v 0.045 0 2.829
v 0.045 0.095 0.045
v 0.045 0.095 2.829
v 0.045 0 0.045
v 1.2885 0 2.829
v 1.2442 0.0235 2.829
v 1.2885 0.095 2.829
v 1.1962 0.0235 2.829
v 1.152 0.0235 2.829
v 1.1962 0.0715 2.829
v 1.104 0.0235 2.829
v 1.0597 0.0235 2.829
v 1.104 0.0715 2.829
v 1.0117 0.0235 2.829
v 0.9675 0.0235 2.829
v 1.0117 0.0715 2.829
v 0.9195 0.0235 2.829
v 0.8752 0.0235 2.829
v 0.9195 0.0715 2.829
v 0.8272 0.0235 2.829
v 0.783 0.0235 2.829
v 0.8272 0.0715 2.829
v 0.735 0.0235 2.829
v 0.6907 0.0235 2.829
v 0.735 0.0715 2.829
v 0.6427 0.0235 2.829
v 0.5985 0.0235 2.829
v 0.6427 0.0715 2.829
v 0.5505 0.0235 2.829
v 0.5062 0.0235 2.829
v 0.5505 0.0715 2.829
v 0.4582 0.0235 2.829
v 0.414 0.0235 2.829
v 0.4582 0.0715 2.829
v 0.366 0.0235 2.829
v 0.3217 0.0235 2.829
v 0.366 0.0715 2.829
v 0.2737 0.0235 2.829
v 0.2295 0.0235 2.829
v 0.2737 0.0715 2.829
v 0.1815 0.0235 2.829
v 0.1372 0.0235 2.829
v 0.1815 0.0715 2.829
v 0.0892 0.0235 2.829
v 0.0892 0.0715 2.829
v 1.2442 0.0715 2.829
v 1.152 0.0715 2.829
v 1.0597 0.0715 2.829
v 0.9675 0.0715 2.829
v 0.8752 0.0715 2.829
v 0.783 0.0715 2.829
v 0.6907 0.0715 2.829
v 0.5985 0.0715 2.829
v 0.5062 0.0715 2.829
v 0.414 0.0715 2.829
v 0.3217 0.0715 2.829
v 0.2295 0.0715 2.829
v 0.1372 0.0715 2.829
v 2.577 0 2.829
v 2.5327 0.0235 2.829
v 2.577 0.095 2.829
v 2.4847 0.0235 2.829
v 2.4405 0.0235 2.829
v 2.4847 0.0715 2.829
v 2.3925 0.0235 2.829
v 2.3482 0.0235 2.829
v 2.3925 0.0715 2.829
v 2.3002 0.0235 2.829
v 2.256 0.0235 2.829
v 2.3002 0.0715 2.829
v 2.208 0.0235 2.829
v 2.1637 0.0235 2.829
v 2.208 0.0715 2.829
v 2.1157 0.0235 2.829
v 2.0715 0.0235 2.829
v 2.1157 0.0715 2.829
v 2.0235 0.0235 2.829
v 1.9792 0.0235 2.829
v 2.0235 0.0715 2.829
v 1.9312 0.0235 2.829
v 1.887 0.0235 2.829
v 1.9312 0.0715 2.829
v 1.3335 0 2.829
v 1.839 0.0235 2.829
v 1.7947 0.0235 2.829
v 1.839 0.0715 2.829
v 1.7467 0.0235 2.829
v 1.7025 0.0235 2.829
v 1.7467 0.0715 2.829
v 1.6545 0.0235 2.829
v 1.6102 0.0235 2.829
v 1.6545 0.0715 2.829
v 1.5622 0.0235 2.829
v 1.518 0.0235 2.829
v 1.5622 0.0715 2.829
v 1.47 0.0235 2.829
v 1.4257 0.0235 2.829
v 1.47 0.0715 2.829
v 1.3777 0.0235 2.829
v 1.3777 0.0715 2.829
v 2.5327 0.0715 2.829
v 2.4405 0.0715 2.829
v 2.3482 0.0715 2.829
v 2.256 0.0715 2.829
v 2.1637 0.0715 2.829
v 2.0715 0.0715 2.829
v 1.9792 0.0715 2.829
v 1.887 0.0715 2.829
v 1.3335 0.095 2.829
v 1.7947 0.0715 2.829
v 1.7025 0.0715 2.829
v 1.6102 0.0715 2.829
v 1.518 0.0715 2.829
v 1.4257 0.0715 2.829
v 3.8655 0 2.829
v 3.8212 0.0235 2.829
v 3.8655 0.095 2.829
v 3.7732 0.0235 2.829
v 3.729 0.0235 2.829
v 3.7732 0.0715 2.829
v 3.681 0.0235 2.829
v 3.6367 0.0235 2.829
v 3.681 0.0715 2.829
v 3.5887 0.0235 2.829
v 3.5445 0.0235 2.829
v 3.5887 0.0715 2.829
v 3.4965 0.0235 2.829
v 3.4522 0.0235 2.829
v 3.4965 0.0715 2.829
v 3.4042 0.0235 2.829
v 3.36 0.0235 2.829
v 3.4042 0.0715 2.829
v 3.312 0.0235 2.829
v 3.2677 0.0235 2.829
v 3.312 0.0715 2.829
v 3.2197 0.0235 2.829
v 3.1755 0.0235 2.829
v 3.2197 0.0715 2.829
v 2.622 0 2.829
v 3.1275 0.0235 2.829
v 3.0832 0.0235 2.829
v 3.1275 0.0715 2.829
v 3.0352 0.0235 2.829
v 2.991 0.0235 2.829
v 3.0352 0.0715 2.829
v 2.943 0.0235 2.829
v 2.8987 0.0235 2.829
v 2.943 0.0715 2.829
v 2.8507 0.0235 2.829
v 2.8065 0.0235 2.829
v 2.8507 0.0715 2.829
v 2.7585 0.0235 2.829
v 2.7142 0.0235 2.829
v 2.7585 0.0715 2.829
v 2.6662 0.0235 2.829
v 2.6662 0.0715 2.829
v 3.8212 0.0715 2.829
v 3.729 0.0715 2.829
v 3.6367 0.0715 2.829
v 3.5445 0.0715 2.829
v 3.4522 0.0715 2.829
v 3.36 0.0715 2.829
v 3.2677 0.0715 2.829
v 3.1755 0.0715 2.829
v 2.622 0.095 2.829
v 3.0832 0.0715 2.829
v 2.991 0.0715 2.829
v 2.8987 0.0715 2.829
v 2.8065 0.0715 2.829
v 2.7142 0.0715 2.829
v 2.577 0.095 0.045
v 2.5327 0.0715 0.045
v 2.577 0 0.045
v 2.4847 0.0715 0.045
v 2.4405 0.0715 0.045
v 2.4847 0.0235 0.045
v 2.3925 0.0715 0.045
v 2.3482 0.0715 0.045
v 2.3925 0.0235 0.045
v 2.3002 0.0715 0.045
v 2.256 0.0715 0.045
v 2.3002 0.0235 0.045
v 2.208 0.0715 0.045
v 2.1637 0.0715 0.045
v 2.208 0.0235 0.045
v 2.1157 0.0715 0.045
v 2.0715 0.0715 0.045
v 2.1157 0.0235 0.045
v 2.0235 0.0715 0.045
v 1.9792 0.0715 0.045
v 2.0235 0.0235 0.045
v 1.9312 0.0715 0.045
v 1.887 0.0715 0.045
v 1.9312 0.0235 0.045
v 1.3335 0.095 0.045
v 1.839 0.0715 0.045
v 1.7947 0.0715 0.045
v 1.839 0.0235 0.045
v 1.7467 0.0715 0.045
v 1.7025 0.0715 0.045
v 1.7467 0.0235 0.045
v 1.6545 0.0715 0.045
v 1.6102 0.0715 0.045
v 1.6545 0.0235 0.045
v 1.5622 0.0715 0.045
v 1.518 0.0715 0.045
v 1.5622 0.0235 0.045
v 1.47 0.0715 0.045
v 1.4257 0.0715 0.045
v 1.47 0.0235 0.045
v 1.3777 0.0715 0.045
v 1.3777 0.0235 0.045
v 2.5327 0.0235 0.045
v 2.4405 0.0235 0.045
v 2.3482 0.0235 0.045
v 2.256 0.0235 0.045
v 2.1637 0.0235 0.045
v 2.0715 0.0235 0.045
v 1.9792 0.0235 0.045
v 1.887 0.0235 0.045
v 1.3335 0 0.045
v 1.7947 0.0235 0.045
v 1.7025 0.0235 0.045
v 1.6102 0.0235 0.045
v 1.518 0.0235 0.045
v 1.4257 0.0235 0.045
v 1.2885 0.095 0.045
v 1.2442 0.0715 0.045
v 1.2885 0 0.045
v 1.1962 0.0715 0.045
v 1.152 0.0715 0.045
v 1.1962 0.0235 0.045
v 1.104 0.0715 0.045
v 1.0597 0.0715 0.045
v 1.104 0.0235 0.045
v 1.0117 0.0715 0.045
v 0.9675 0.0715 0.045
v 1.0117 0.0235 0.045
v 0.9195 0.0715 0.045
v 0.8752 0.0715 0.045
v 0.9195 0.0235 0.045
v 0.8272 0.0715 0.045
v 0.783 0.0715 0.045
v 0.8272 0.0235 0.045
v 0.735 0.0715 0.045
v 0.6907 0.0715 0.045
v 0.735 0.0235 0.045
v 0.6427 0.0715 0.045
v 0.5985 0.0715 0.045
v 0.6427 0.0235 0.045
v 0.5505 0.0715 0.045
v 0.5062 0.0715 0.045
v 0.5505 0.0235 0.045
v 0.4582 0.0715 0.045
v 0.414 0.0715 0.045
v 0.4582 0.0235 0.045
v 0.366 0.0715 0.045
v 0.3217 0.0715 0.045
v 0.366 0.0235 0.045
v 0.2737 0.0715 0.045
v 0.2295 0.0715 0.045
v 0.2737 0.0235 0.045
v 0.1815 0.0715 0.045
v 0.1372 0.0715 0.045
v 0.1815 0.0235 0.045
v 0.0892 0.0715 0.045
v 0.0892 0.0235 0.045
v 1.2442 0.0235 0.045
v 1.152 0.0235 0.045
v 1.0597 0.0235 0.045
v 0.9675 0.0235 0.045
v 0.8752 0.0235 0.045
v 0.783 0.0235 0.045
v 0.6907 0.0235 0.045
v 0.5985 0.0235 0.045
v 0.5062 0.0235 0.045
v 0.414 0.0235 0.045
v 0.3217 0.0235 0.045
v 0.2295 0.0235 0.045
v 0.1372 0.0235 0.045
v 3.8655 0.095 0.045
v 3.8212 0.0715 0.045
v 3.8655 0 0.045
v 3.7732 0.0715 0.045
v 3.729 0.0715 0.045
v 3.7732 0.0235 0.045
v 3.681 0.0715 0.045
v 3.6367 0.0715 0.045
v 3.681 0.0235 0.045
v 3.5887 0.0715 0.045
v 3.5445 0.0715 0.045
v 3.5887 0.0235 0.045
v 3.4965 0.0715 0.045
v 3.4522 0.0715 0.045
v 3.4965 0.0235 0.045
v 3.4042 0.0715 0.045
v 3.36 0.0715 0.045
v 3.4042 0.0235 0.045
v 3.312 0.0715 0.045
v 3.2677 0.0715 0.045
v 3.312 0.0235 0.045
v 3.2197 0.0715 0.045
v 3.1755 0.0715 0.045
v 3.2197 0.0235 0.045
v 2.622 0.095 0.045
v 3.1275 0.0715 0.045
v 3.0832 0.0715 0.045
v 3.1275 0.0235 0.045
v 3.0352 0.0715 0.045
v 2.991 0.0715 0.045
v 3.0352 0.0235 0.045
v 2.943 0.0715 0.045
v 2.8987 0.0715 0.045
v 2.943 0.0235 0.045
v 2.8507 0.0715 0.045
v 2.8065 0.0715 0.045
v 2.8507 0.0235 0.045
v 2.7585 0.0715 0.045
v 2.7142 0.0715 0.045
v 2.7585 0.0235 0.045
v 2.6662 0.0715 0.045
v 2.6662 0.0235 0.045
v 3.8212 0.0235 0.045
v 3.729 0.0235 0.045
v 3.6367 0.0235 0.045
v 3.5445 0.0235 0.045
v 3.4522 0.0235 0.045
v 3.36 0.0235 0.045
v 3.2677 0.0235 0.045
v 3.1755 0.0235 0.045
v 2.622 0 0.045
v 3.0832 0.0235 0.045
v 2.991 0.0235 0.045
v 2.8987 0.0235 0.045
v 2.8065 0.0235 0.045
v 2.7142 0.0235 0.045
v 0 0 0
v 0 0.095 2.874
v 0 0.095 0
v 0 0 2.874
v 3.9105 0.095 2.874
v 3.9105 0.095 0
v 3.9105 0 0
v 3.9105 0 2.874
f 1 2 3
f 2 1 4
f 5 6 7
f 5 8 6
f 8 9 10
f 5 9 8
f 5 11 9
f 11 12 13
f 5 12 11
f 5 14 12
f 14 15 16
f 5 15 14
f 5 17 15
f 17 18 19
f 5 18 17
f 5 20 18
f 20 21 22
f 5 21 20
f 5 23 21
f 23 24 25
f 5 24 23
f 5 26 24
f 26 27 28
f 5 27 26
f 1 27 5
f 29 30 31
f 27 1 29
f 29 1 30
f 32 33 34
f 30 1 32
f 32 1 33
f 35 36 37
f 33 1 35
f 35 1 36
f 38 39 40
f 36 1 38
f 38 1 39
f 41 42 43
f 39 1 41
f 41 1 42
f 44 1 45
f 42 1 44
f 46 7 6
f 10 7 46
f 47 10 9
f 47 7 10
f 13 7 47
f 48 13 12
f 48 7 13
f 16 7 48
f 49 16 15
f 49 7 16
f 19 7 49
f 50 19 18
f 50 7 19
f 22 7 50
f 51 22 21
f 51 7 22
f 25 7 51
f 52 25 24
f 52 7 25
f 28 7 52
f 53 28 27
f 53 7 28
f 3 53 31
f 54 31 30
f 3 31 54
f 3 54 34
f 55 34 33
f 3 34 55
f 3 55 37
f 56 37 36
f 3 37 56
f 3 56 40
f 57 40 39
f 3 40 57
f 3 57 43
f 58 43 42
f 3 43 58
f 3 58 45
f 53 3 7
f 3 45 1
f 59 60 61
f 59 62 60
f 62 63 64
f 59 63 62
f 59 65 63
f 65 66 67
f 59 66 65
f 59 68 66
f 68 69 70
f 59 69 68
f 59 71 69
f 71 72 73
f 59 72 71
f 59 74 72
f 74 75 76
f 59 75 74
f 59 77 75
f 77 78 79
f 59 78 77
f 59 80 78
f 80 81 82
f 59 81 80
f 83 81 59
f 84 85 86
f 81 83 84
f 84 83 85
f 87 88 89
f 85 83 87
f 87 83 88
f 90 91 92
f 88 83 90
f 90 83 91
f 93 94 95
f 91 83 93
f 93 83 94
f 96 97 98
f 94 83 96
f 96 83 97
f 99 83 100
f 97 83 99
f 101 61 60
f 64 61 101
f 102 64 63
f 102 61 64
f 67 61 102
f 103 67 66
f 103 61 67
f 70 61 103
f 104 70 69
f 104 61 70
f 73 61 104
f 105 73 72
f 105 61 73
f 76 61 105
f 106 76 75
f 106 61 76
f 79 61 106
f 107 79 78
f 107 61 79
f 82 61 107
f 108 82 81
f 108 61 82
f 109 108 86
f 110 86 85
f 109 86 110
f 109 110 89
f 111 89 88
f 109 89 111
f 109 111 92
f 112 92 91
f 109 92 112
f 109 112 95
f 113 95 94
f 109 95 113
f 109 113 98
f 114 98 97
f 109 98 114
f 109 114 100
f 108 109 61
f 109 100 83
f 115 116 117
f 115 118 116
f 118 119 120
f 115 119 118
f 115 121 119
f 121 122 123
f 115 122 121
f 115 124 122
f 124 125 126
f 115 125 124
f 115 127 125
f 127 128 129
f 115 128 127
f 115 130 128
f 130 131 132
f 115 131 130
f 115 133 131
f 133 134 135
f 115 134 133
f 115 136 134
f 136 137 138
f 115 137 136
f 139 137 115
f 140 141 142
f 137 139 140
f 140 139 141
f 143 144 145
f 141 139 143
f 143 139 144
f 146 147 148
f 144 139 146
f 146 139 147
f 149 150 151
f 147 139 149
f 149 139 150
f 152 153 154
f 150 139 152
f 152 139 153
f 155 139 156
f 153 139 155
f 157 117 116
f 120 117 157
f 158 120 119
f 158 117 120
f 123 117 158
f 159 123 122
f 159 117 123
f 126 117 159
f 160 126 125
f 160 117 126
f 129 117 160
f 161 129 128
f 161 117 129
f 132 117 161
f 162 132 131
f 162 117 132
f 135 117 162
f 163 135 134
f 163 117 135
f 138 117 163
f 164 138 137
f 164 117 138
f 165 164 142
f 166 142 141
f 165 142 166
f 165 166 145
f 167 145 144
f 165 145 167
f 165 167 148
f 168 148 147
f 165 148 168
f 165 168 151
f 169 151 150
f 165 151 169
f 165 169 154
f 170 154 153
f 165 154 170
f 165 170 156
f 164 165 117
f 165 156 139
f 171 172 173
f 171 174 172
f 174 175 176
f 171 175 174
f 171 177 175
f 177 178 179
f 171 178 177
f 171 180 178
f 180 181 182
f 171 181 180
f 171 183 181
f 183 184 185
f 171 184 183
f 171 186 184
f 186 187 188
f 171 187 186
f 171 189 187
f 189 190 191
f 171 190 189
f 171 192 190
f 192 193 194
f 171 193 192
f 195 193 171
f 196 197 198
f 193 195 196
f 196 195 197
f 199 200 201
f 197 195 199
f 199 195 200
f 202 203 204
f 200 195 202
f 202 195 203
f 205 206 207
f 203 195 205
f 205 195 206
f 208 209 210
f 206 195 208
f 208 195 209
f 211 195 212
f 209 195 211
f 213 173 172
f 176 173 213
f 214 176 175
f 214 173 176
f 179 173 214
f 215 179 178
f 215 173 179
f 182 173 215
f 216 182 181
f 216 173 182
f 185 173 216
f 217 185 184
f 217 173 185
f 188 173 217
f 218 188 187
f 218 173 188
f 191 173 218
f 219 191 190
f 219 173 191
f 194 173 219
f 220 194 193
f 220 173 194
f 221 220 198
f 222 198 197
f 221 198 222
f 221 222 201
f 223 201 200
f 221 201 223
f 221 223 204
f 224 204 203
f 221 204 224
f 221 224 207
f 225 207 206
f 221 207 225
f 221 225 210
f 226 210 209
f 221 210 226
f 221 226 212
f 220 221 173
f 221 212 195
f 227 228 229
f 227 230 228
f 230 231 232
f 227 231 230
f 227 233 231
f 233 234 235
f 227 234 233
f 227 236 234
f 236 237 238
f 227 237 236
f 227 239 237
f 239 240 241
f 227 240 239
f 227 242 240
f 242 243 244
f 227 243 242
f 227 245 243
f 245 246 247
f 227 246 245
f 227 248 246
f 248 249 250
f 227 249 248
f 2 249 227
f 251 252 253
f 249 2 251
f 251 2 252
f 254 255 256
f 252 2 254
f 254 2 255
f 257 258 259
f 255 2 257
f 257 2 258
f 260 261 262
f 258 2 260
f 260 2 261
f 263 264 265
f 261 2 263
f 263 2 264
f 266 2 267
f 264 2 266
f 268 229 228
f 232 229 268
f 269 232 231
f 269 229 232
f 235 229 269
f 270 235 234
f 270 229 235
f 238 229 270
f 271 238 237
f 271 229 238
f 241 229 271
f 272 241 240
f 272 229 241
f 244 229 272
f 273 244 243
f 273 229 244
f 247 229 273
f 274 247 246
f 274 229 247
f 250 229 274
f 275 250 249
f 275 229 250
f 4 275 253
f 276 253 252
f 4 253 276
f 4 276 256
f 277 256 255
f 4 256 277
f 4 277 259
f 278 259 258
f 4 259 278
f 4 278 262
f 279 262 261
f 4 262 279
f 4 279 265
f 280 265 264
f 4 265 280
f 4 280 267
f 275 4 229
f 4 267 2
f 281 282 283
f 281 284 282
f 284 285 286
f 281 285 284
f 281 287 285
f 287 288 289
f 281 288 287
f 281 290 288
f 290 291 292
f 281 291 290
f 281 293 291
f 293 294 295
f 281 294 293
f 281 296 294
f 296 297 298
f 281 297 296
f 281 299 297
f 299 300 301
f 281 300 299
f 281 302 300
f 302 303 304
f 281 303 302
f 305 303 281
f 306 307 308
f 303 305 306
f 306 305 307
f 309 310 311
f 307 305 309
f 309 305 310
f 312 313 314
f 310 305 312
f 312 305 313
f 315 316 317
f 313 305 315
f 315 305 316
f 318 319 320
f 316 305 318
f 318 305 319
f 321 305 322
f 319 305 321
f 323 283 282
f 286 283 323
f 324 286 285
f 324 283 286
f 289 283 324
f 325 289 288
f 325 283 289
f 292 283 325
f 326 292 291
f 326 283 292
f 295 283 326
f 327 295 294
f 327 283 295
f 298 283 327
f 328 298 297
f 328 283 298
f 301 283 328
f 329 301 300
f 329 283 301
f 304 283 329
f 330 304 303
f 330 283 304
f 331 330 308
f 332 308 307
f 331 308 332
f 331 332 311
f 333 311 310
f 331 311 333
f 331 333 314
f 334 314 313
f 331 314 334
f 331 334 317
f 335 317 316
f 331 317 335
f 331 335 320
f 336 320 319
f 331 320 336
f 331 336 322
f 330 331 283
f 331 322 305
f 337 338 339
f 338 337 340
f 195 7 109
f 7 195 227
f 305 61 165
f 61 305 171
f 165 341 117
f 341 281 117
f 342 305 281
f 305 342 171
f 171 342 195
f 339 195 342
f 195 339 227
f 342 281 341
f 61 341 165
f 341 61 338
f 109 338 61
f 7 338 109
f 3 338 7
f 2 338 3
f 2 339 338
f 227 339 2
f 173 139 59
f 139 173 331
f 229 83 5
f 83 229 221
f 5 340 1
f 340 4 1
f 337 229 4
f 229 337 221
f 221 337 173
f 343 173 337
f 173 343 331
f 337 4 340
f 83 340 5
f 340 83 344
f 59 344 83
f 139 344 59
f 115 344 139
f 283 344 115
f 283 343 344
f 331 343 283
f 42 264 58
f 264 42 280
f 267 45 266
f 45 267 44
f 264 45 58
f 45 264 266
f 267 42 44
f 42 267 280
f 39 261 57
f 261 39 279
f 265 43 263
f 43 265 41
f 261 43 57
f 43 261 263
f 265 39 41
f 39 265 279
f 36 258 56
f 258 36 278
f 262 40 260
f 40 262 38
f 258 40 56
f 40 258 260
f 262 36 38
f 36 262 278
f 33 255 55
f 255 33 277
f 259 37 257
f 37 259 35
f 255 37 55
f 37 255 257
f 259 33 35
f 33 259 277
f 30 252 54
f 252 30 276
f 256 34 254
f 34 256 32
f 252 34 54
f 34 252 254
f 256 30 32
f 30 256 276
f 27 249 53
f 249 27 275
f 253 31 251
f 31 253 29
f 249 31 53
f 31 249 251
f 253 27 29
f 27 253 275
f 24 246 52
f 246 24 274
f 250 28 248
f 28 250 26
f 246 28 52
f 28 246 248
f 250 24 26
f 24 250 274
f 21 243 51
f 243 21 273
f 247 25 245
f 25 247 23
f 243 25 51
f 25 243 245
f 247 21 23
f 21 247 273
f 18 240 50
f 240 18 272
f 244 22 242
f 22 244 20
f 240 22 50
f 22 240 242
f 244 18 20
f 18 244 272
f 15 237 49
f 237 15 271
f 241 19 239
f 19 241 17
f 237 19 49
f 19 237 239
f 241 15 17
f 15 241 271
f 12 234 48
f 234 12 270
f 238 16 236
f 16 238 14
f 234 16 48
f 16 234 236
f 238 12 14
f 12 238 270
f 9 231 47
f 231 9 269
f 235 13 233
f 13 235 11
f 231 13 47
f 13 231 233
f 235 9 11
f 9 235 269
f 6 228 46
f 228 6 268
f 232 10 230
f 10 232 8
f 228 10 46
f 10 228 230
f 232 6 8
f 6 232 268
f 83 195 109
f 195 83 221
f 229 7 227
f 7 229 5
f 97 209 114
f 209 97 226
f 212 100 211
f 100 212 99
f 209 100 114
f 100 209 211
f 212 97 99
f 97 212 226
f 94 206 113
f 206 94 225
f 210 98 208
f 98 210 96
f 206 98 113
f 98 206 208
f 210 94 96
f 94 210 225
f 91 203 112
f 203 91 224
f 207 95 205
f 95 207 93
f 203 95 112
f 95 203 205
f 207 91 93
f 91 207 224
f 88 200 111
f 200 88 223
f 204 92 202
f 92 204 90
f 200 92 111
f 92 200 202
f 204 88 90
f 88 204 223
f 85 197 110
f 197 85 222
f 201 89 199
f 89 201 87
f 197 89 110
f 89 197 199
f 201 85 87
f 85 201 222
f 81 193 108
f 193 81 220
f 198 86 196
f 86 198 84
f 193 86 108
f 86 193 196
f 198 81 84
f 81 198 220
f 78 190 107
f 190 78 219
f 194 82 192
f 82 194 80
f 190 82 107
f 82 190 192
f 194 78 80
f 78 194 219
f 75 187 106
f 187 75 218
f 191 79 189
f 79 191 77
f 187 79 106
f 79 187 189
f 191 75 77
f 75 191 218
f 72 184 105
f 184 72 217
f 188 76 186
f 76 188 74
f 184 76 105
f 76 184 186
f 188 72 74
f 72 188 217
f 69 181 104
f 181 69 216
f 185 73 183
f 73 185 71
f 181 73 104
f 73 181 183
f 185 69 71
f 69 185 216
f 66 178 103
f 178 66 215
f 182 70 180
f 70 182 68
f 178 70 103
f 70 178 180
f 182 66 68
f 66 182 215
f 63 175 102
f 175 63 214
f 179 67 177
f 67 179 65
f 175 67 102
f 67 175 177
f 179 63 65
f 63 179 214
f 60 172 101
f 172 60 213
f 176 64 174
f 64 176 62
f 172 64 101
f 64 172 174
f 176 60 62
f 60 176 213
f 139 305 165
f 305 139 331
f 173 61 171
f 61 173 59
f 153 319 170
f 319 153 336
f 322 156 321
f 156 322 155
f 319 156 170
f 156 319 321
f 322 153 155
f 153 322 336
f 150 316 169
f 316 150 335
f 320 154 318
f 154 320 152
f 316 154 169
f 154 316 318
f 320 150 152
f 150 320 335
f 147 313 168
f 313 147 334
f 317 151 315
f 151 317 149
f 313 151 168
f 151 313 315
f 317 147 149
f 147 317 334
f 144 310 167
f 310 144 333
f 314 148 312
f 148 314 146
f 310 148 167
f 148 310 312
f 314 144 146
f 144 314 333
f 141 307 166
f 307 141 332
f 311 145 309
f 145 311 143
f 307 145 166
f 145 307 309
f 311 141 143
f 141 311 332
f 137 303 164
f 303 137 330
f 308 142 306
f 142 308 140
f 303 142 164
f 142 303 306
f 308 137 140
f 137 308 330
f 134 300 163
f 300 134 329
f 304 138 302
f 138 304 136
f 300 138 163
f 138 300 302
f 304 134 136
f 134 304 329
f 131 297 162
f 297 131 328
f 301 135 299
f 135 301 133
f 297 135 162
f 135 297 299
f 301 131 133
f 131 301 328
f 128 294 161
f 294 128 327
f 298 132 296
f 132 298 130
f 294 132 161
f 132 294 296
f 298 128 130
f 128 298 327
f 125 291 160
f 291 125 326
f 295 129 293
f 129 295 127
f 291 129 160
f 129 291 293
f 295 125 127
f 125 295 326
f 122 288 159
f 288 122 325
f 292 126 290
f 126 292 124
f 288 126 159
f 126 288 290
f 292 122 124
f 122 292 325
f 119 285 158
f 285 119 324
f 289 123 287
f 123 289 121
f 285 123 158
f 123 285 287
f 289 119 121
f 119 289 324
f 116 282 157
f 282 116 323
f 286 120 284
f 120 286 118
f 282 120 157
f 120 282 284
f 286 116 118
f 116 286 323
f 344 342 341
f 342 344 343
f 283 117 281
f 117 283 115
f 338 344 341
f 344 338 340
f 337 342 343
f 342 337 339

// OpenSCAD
// Staketet på norra sidan av västra terrassen — utbrutet ur house.scad
// Alla mått i meter
//
// Fristående fil, parametriserad på antal virken i stället för på önskad
// öppning: antalet 2x4 totalt och antalet 2x2 i varje sektion mellan två 2x4.
// Öppningen mellan virkena faller ut ur det, så att staketet går jämnt ut
// över hela längden.
//
// Staketet står i origo, fristående från husmodellen:
//   x = 0  västra 2x4:ans västra sida, staketet går österut längs +X
//   y = 0  södra sidan av 2x4:orna, 95 mm-sidan går norrut längs +Y
//   z = 0  bottenregelns undersida
//
// Virkesmåtten är de verkliga hyvlade måtten (2x4 = 45x95, 2x2 = 48x48), inte
// de nominella som house.scad räknar med.
//
// Med kommer:
//  - 2x4 i båda ändarna och jämnt fördelade däremellan
//  - 2x2 i sektionerna mellan dem
//  - handledaren ovanpå
//  - bottenregeln under stolpfötterna

// === PARAMETRAR ===

// Indelning
railing_big_count     = 4;      // Antal 2x4 totalt, ändarna inräknade
railing_small_per_bay = 13;    // Antal 2x2 i varje sektion mellan två 2x4

// Virke
railing_post_size  = 0.048;     // 2x2, 48x48 mm
railing_top_width  = 0.095;     // 2x4, bredd 95 mm
railing_top_height = 0.045;     // 2x4, höjd 45 mm
railing_post_len   = 2.784;     // Stolparnas längd, 2x2 och 2x4 lika

// Bärande 2x4-stolpar i räcket — vridna 90° kring sin längsaxel, dvs
// 95 mm-sidan ligger tvärs räcket och 45 mm-sidan längs räckets riktning.
railing_big_across = 0.095;     // 2x4: 95 mm tvärs räcket
railing_big_along  = 0.045;     // 2x4: 45 mm längs räckets riktning
// Stolpen centreras över 2x2-linjen, i liv med den liggande handledaren
railing_big_offset = (railing_big_across - railing_post_size) / 2;

// Staketets utsträckning i öst-väst, från västra 2x4:ans västra sida till
// husväggen: 3934 minus 2x4:ans centrering över 2x2-linjen.
north_extent = 3.934 - (railing_big_across - railing_post_size) / 2;

// Beräknade värden

railing_bays = railing_big_count - 1;   // Sektioner mellan 2x4:orna

// CC mellan 2x4:orna. Den sista 2x4:an står utanför sektionerna, därför dras
// en 2x4 av innan längden delas.
railing_pitch = (north_extent - railing_big_along) / railing_bays;

// Öppningen, lika stor mellan alla virken i sektionen — även intill 2x4:orna
railing_gap = (railing_pitch - railing_big_along
               - railing_small_per_bay * railing_post_size)
              / (railing_small_per_bay + 1);

// 2x2-linjens södra sida. 2x4:orna är centrerade över den, så deras södra
// sida hamnar i y = 0.
railing_line_y = railing_big_offset;

// Stolparna står på bottenregeln och handledaren ligger på stolparna
railing_foot_z = railing_top_height;
railing_top_z  = railing_foot_z + railing_post_len;
railing_total_height = railing_top_z + railing_top_height;

// === STAKETET I NORR ===

// 2x4 med västra sidan i x
module railing_big_post(x) {
    translate([x, railing_line_y - railing_big_offset, railing_foot_z]) {
        cube([railing_big_along, railing_big_across, railing_post_len]);
    }
}

// 2x2 med västra sidan i x
module railing_small_post(x) {
    translate([x, railing_line_y, railing_foot_z]) {
        cube([railing_post_size, railing_post_size, railing_post_len]);
    }
}

// Alla stolpar i ordning från väster till öster, som [västra sidan, 2x4?].
// Både modellen och borrlistan läses härifrån, så de kan inte glida isär.
railing_post_list = [
    for (b = [0 : railing_bays - 1]) each concat(
        [[b * railing_pitch, true]],
        [for (i = [0 : railing_small_per_bay - 1])
            [b * railing_pitch + railing_big_along + railing_gap
             + i * (railing_post_size + railing_gap), false]]),
    [railing_bays * railing_pitch, true]
];

function railing_post_width(big) = big ? railing_big_along : railing_post_size;

module railing_posts() {
    for (p = railing_post_list) {
        if (p[1]) railing_big_post(p[0]);
        else      railing_small_post(p[0]);
    }
}

// Liggande 2x4 längs staketet — handledare på ovansidan eller bottenregel.
// Centreras över stolplinjen, precis som de bärande 2x4-stolparna.
// z = regelns underkant.
module railing_rail(z) {
    translate([0, railing_line_y - (railing_top_width - railing_post_size) / 2, z]) {
        cube([north_extent, railing_top_width, railing_top_height]);
    }
}

// === FÄRGER ===
organowood = [0.9, 0.88, 0.85];       // Silvergrå/vit (organowood-behandlat)
railing_farg = organowood;            // Räcket i samma ton som huset

// === MODELL ===
module norr_staket() {
    color(railing_farg) {
        railing_posts();
        railing_rail(railing_top_z);   // Handledare
        railing_rail(0);               // Bottenregel
    }
}

norr_staket();

echo("=== STAKETET I NORR ===");
echo(str("Längd: ", north_extent, " m"));
echo(str("Stolplängd: ", railing_post_len, " m"));
echo(str("Total höjd: ", railing_total_height, " m"));
echo(str("2x4: ", railing_big_count, " st, CC ", railing_pitch * 1000, " mm"));
echo(str("2x2: ", railing_bays, " sektioner á ", railing_small_per_bay, " st = ",
    railing_bays * railing_small_per_bay, " st"));
echo(str("Öppning: ", railing_gap * 1000, " mm, CC 2x2 ",
    (railing_gap + railing_post_size) * 1000, " mm"));

// === HÅLBORRNINGSLISTA ===
// Stolparnas centrum längs staketet, mätt från östra änden (husväggen) och
// västerut. Stolpe 1 är den östligaste. Hela mm; en halv mm avrundas alltid
// uppåt — utan tillägget avgör flyttalsfelet åt vilket håll 22,5 hamnar.
echo("=== HÅLBORRNINGSLISTA (från öster) ===");
for (n = [1 : len(railing_post_list)]) {
    p = railing_post_list[len(railing_post_list) - n];
    center = p[0] + railing_post_width(p[1]) / 2;
    echo(str("Stolpe ", n, ": ", round((north_extent - center) * 1000 + 1e-6), " mm",
             p[1] ? "  (2x4)" : ""));
}
